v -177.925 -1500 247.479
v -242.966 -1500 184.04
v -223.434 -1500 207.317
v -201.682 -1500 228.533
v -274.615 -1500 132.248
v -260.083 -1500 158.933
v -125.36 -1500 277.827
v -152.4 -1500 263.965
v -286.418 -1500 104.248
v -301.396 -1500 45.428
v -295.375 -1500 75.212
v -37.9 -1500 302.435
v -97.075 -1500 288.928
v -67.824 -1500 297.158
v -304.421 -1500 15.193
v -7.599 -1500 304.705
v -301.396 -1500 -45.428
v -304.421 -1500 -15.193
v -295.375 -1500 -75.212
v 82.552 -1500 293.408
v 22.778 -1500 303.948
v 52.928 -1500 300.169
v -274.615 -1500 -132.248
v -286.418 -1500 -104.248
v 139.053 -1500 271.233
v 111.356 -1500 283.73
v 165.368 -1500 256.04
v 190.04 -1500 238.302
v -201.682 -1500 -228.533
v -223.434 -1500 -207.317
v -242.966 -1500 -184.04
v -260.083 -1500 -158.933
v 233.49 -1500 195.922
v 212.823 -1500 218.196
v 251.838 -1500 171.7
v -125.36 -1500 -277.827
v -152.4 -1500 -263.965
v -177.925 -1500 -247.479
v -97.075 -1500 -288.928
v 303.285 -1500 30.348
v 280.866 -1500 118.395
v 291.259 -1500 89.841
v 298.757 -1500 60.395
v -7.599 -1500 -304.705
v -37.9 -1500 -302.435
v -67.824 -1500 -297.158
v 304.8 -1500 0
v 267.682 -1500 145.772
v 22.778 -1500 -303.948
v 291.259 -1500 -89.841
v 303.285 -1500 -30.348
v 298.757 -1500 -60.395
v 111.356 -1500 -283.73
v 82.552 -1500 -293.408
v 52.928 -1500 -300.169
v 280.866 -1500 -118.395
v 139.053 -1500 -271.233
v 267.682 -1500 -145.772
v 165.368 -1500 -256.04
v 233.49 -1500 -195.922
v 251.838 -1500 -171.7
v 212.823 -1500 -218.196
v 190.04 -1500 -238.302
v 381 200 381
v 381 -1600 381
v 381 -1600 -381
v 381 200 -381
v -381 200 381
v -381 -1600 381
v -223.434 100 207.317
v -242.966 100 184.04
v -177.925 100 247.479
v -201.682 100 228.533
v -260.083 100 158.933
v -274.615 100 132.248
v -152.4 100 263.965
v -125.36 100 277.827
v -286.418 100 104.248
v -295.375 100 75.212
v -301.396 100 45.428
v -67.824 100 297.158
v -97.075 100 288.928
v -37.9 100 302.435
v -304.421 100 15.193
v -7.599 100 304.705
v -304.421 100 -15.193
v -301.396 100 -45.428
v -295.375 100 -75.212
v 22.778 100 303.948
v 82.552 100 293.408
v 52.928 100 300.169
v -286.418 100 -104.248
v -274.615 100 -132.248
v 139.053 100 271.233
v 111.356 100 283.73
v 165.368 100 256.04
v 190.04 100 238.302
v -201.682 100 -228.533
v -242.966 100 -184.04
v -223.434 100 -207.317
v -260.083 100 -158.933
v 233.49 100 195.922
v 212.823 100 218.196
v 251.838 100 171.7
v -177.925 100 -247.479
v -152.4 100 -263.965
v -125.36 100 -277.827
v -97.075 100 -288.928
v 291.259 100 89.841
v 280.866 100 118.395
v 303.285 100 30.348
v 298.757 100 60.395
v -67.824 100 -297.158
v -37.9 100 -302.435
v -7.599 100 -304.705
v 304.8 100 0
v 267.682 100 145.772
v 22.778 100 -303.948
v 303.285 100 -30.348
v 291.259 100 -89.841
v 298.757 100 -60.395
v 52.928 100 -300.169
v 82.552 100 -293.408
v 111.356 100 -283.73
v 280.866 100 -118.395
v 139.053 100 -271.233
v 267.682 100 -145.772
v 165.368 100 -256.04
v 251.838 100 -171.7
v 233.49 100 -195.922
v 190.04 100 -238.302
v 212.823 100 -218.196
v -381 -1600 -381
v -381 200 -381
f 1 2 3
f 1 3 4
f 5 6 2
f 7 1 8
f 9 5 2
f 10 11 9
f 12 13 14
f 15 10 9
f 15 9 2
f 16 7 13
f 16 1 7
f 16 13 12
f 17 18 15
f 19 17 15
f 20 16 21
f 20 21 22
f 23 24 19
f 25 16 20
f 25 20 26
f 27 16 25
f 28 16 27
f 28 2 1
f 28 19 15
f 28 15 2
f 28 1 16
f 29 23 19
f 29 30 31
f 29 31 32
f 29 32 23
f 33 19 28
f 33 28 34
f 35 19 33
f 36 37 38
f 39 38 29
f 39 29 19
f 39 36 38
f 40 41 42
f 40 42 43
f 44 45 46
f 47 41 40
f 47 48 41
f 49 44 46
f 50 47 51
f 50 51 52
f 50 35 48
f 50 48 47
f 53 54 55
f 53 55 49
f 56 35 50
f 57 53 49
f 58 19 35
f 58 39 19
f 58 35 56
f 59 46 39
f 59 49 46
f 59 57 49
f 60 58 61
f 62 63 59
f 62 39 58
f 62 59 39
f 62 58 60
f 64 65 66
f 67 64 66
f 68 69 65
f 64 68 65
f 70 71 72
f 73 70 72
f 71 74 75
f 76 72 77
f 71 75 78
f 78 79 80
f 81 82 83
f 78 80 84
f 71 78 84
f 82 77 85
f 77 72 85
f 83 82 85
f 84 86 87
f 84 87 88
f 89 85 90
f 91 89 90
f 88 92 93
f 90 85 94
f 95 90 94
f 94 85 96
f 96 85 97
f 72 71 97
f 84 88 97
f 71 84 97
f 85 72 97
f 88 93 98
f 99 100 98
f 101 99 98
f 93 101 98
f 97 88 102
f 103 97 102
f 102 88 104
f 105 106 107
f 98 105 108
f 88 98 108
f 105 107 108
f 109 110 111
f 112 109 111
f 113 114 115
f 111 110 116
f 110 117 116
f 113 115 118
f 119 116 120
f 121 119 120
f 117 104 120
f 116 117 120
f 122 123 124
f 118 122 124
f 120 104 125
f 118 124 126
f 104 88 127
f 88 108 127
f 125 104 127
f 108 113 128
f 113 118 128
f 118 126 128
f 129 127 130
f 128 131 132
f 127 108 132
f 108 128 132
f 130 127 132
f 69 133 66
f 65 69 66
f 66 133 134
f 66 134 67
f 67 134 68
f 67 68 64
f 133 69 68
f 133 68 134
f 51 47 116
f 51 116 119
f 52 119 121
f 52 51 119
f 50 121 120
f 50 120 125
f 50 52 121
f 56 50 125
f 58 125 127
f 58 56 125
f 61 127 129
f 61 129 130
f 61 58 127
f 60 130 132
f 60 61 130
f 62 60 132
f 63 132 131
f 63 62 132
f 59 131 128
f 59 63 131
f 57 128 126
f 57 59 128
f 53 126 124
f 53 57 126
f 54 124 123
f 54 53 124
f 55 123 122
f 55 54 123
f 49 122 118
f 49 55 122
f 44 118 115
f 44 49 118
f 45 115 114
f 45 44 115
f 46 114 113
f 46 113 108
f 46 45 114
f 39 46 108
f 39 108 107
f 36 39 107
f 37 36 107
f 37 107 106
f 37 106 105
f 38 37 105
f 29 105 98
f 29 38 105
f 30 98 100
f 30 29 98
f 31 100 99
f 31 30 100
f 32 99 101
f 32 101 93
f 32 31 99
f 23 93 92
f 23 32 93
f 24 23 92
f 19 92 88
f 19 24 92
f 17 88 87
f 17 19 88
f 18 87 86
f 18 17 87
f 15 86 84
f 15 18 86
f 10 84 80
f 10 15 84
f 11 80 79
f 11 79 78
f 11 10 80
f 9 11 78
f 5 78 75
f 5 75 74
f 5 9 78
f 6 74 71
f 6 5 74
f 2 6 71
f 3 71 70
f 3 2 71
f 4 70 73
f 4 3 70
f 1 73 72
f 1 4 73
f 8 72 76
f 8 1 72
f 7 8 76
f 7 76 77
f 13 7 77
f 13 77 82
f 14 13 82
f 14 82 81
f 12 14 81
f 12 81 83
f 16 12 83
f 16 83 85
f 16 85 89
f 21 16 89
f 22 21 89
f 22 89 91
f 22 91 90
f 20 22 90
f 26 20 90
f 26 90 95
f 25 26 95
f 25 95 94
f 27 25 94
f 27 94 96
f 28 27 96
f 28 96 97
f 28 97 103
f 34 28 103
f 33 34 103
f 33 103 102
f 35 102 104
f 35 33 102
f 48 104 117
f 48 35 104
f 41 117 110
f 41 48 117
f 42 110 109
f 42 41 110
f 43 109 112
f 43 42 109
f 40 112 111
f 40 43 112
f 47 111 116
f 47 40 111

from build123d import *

# Parameters (mm, degrees)
BOSS_EXTRUDE1_DEPTH      = 200
BOSS_EXTRUDE1_DEPTH_BACK = 1600
SKETCH1_W                = 762
SKETCH1_H                = 762
CAVITY1_START            = -1500
CAVITY1_OUTLINE_R        = 304.8
CAVITY1_DEPTH            = 1600


# Read off the part's stored shape, not the designer's step: Cavity1
with BuildPart() as part:
    # Sketch1 → Boss-Extrude1 (new, two sides: drawn at the far end of the back side and taken through both)
    with BuildSketch(Plane(origin=(0, 0, 0), x_dir=(1, 0, 0), z_dir=(0, 1, 0)).offset(-BOSS_EXTRUDE1_DEPTH_BACK)):
        Rectangle(SKETCH1_W, SKETCH1_H)
    extrude(amount=BOSS_EXTRUDE1_DEPTH + BOSS_EXTRUDE1_DEPTH_BACK)

    # Cavity1 outline → Cavity1 (cut)
    with BuildSketch(Plane(origin=(0, 0, 0), x_dir=(1, 0, 0), z_dir=(0, 1, 0)).offset(CAVITY1_START)):
        Circle(CAVITY1_OUTLINE_R)
    extrude(amount=CAVITY1_DEPTH, mode=Mode.SUBTRACT)


solid = part.part
